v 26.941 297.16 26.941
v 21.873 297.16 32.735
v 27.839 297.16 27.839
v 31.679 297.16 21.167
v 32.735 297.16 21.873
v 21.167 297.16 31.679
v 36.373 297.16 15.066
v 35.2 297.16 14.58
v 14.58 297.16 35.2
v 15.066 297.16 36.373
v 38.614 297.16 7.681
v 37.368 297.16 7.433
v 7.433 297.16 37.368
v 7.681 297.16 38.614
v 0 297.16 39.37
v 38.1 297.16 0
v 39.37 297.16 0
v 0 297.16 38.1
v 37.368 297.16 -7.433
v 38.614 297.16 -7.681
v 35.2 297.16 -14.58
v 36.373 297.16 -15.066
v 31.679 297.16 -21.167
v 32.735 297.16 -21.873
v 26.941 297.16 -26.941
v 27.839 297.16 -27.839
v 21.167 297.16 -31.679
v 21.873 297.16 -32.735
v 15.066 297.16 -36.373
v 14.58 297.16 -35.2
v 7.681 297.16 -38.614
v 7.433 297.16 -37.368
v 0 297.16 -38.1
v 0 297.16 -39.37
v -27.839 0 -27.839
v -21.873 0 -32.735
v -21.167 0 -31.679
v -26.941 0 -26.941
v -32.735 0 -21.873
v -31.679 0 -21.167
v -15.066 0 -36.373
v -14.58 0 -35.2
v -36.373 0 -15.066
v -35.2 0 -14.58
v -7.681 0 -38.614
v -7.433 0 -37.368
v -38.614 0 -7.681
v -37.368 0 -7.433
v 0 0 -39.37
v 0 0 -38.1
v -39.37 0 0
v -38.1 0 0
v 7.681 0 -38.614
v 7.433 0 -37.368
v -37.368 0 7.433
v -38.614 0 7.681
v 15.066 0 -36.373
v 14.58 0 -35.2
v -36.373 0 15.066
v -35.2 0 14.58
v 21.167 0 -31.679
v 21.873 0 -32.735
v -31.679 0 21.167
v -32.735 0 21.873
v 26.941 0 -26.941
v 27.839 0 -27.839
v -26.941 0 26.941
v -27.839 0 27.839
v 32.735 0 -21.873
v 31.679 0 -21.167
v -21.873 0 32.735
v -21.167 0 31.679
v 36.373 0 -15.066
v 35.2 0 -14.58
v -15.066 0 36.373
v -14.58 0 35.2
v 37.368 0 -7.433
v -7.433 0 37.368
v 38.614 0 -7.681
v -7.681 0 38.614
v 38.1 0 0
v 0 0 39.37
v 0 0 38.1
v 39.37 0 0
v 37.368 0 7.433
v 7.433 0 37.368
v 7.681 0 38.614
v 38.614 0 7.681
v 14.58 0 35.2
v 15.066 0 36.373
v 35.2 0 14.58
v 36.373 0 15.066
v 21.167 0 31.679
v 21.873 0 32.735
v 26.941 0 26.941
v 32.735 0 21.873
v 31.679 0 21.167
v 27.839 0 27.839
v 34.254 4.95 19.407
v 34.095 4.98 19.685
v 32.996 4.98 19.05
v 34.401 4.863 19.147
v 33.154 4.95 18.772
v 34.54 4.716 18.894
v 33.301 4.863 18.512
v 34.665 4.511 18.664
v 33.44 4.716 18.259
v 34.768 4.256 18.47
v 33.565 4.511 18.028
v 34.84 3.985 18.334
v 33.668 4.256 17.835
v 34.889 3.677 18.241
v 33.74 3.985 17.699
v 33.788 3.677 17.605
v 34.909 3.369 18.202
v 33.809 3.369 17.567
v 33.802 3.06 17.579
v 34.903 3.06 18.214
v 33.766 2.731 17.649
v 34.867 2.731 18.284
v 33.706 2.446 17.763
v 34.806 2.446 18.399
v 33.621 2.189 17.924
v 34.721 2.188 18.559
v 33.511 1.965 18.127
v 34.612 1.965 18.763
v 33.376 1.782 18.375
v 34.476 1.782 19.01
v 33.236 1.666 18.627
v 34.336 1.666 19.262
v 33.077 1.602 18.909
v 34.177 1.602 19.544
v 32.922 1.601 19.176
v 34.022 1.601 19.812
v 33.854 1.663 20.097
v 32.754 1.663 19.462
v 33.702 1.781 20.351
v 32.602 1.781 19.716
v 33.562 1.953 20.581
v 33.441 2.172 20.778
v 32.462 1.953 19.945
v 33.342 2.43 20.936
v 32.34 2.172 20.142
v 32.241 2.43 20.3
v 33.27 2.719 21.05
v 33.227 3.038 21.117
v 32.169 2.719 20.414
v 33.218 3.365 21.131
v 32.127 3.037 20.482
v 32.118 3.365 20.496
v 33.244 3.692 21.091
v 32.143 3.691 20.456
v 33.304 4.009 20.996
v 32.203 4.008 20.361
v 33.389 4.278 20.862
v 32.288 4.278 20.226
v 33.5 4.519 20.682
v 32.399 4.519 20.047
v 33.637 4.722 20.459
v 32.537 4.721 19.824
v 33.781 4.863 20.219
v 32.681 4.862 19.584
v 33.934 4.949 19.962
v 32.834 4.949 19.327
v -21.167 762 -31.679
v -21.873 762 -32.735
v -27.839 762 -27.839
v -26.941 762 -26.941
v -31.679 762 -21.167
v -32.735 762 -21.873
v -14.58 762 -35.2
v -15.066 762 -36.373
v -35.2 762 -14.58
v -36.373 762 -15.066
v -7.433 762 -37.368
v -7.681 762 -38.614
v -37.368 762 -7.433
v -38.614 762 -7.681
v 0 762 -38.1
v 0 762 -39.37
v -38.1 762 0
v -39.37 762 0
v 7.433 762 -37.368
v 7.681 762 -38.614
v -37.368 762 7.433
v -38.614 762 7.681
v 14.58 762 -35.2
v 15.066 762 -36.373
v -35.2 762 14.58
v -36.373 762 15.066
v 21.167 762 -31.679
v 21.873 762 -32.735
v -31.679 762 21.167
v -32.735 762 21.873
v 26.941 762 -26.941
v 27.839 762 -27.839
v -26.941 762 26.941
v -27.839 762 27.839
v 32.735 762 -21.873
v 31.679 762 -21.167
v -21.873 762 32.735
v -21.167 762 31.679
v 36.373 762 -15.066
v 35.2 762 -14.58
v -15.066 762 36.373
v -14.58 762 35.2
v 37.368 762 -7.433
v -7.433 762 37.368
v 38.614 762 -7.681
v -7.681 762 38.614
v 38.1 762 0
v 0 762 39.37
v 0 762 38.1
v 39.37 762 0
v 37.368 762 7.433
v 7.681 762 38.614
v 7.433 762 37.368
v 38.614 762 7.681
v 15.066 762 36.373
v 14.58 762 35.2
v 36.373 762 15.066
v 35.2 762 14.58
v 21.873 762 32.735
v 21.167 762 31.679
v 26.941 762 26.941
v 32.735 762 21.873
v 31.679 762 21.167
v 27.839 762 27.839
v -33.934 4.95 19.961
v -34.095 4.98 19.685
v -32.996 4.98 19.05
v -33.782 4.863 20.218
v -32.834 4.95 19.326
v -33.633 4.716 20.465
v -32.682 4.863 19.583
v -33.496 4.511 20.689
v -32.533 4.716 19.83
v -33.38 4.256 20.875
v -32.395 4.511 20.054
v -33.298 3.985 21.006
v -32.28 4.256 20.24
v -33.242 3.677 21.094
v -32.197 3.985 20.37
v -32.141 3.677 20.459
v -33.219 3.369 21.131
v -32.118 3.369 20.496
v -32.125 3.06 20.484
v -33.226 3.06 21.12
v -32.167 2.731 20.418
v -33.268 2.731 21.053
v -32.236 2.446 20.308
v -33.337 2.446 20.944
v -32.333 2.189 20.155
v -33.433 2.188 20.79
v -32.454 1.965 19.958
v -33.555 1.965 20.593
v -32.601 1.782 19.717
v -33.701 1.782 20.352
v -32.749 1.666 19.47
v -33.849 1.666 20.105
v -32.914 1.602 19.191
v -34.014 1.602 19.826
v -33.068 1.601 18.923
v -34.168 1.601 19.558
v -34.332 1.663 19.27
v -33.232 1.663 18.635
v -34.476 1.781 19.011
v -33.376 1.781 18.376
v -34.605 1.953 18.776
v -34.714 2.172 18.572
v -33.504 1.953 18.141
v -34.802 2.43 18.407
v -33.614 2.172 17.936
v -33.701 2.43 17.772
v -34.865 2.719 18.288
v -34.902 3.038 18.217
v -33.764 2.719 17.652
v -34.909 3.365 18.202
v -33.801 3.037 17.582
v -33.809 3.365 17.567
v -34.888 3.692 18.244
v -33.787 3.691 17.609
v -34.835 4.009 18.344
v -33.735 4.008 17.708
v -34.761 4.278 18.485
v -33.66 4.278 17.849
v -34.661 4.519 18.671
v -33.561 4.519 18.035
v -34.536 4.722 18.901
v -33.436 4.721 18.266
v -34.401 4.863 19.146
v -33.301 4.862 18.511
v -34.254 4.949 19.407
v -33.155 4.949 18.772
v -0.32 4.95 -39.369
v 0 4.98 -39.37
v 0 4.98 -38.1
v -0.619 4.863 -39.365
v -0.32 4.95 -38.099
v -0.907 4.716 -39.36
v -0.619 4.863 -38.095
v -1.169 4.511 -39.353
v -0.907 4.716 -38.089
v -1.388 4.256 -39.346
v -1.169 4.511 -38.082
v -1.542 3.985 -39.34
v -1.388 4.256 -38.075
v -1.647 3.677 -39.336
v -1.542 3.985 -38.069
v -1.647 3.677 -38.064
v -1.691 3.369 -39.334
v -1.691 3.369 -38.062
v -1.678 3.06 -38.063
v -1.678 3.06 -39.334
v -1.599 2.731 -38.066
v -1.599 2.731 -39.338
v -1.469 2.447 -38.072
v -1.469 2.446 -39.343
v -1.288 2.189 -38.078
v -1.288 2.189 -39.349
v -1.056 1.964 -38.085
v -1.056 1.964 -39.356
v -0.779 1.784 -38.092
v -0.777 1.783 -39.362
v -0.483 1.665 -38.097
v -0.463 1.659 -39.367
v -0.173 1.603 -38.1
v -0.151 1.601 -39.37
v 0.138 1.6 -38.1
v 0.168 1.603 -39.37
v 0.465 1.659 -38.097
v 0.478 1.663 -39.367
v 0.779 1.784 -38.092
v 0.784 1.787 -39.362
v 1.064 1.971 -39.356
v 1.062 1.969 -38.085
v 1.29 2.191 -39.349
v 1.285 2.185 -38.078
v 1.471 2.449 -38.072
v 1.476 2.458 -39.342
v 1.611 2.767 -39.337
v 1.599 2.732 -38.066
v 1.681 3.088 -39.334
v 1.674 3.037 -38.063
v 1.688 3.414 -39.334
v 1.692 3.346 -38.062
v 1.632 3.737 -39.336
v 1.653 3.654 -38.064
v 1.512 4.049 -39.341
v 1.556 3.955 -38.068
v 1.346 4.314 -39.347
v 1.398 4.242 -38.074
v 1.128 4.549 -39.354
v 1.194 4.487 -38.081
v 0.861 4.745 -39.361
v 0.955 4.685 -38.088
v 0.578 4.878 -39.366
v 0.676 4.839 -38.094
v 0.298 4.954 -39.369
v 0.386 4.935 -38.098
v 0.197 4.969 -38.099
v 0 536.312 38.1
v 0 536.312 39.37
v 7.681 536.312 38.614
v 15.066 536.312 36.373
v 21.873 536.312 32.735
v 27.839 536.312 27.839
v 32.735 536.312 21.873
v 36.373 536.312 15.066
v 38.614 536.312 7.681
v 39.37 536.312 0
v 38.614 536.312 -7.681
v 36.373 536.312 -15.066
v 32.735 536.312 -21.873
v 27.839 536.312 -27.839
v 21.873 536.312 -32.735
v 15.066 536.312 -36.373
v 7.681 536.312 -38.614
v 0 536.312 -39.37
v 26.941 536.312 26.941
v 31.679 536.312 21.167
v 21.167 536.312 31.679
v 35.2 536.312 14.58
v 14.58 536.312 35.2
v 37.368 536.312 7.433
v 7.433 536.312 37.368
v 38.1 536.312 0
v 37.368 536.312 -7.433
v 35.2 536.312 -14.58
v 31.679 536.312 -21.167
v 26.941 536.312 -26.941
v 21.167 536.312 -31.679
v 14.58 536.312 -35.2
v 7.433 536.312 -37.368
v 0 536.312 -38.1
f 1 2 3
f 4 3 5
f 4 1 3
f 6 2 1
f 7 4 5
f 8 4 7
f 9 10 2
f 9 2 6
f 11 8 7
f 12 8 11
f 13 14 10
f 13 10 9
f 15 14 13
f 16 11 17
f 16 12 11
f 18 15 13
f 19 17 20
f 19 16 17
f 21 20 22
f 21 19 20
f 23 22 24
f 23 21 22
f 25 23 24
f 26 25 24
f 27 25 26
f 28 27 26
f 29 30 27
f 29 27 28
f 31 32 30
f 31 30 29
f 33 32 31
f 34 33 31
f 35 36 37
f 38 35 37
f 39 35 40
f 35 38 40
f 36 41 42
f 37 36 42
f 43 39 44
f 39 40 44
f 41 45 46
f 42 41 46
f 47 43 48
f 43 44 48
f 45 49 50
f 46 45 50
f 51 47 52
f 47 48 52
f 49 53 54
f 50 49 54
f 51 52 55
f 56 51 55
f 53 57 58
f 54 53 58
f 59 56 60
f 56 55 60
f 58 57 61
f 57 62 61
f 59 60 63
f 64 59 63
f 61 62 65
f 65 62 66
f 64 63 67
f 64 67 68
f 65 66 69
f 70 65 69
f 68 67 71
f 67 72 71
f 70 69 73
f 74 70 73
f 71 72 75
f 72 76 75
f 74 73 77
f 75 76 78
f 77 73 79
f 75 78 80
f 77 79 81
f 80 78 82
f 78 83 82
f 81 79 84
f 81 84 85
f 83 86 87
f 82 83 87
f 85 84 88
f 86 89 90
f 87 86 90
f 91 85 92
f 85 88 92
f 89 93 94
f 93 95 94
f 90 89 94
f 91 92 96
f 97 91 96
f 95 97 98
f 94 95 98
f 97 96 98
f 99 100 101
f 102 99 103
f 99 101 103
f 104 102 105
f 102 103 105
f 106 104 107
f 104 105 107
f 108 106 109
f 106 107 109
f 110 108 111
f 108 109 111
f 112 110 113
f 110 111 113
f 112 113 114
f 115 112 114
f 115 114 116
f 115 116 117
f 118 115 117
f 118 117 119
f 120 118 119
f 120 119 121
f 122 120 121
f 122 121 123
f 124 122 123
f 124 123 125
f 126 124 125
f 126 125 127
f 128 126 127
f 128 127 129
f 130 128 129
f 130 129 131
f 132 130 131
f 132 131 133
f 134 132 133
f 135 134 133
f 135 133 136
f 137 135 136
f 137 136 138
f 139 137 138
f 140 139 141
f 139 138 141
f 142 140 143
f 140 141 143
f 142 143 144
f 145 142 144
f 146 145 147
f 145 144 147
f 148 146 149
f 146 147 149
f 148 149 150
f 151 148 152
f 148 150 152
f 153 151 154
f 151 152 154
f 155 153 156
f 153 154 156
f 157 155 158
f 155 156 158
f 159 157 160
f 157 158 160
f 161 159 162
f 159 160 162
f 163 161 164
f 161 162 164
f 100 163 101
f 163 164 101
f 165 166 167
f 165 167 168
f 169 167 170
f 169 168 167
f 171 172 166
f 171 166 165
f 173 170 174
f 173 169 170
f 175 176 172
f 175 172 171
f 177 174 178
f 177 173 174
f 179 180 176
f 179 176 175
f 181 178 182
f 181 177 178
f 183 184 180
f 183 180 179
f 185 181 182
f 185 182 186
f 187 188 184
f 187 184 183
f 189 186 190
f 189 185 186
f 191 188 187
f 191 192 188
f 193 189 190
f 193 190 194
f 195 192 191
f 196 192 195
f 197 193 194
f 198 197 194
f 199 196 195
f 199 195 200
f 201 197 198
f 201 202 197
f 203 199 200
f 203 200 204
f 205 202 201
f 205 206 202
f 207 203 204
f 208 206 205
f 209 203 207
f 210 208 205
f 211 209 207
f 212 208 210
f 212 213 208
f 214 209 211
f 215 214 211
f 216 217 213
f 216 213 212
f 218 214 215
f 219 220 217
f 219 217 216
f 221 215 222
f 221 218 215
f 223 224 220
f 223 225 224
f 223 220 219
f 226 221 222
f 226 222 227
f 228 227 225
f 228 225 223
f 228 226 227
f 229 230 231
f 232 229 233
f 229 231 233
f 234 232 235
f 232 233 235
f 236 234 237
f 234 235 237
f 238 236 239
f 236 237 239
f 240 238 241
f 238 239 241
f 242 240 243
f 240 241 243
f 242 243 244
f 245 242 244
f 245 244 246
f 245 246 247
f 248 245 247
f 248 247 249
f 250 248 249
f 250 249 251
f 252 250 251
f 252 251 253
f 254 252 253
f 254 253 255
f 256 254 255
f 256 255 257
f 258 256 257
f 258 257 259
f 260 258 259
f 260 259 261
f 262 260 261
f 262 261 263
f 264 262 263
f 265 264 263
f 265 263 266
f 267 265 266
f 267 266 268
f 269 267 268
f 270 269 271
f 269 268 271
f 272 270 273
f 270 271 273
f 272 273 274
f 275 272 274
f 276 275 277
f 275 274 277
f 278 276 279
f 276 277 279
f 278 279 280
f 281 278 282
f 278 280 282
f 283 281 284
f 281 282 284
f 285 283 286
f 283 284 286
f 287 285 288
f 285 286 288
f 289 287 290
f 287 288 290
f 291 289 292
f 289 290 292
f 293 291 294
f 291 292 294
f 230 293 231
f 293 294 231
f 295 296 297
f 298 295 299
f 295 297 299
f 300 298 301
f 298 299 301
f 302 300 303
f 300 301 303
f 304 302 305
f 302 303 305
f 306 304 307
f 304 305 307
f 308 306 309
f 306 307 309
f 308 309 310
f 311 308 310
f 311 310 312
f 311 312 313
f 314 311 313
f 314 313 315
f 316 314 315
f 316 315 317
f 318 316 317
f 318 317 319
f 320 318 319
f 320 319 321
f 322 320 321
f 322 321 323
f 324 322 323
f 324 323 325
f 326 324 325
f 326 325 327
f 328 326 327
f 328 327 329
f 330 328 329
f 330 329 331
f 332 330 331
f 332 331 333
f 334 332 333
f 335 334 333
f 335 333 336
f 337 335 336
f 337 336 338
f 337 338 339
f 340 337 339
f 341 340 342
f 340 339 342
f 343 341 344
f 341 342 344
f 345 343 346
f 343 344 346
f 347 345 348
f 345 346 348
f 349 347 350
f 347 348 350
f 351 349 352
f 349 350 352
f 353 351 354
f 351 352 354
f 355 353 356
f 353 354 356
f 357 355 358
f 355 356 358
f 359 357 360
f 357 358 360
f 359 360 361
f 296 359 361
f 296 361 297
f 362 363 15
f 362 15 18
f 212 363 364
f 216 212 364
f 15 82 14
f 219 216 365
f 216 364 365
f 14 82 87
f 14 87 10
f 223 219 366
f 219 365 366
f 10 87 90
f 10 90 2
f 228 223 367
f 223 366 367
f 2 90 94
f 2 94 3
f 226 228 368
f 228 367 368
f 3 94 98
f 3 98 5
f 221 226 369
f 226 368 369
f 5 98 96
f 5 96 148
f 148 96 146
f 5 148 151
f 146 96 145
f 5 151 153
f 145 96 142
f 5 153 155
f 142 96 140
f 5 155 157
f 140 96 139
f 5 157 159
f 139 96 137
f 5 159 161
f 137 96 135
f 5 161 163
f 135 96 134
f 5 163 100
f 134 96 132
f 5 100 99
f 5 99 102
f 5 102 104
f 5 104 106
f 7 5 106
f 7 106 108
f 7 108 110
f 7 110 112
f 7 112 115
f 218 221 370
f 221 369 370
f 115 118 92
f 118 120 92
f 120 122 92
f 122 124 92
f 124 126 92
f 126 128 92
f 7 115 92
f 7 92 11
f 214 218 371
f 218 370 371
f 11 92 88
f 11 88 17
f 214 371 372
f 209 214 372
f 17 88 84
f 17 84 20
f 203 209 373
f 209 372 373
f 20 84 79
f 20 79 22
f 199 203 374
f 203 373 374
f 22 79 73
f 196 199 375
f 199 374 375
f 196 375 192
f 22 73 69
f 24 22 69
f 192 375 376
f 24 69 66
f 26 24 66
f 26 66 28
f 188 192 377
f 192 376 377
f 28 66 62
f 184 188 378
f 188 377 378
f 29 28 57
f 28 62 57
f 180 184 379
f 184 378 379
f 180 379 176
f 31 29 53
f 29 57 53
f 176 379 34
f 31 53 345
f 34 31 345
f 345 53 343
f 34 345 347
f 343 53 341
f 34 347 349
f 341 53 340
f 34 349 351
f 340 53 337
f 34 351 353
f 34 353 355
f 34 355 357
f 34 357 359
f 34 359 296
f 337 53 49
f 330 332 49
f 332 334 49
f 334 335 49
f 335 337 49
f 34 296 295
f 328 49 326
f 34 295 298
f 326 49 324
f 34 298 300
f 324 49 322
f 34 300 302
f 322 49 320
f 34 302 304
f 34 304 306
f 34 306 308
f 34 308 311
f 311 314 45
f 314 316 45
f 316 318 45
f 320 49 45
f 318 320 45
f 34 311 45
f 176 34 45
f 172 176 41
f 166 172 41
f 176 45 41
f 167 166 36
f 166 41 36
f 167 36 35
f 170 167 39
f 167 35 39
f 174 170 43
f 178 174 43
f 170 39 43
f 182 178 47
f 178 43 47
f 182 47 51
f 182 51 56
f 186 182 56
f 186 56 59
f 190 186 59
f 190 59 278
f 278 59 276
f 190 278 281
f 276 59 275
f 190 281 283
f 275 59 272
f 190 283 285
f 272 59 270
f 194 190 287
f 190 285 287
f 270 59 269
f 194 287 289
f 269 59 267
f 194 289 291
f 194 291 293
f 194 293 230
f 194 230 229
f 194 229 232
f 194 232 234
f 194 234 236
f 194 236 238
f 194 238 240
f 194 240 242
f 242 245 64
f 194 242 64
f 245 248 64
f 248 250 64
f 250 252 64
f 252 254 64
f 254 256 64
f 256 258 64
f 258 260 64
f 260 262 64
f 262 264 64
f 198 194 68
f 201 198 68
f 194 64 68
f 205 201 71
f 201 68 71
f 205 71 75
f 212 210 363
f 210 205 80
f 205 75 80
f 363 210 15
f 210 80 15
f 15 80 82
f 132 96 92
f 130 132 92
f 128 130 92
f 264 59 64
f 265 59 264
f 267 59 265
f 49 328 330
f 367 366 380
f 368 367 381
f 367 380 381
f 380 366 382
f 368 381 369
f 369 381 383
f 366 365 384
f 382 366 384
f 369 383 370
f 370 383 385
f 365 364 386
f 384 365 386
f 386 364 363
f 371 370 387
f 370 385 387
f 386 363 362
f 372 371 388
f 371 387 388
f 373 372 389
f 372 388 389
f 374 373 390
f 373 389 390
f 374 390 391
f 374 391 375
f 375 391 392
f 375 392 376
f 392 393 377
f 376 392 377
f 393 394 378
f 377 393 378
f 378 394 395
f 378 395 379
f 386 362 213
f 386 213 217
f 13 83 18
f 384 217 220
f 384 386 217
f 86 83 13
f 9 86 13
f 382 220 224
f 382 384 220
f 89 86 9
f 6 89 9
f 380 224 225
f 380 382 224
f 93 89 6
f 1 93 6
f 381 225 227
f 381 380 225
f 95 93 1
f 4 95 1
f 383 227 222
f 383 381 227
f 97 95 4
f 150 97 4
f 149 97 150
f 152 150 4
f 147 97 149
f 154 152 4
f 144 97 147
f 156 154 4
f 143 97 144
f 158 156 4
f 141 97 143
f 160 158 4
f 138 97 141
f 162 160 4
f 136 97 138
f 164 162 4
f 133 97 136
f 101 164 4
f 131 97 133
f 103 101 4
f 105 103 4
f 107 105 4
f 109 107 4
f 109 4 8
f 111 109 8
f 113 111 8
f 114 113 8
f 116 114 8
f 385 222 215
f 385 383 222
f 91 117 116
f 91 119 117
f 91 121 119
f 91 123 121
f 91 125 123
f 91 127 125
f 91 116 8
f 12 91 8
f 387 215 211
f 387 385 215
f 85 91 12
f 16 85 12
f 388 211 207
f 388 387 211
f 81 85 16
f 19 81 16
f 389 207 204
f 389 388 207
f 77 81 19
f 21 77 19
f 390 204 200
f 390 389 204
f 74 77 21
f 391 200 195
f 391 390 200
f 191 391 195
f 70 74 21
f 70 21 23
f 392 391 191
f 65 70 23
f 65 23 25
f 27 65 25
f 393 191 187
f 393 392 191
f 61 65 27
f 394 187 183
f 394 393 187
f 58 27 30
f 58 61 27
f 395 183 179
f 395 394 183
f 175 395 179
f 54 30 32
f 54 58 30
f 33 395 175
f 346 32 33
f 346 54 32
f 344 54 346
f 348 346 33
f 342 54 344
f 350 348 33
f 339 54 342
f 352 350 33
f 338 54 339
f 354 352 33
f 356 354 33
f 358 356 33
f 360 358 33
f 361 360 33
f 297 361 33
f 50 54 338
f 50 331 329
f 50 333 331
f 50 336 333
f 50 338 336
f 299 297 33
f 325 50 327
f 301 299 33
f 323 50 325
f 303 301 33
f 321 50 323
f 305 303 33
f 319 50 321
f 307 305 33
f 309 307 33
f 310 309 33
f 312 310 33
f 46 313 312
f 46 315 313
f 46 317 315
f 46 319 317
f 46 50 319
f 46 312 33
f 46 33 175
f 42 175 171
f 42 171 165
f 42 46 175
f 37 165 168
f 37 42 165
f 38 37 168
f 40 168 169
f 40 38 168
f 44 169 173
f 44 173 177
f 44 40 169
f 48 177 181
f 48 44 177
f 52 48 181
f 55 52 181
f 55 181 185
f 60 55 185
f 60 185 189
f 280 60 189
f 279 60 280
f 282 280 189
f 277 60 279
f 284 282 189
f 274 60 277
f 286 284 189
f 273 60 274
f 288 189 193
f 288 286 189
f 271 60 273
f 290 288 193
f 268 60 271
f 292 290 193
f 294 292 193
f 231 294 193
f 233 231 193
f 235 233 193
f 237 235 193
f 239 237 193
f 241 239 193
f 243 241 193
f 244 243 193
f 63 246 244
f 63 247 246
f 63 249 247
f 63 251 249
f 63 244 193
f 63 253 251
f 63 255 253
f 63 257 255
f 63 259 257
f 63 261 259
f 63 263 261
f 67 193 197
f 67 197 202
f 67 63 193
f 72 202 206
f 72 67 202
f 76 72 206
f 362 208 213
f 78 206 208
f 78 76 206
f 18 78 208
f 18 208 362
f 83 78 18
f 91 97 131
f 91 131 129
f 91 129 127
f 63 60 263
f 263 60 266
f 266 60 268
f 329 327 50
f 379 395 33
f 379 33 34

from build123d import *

# Parameters (mm, degrees)
SKETCH1_R           = 39.37
SKETCH1_R_2         = 38.1
BOSS_EXTRUDE1_DEPTH = 762
SKETCH2_R           = 1.692869147
CUT_EXTRUDE1_DEPTH  = 61.4
CIRPATTERN3_COUNT   = 3
SKETCH4_W           = 96.846889453
SKETCH4_H           = 239.152522935
CUT_EXTRUDE3_DEPTH  = 200


with BuildPart() as part:
    # Sketch1 → Boss-Extrude1 (new body)
    with BuildSketch(Plane(origin=(0, 0, 0), x_dir=(1, 0, 0), z_dir=(0, 1, 0))):
        with Locations(Location((0, 0, 0), (0, 0, 270))):
            Circle(SKETCH1_R)
        with Locations(Location((0, 0, 0), (0, 0, 270))):
            Circle(SKETCH1_R_2, mode=Mode.SUBTRACT)
    extrude(amount=BOSS_EXTRUDE1_DEPTH)

    # Sketch2 → Cut-Extrude1 (cut)
    with BuildSketch(Plane.XY):
        with Locations(Location((0, 3.287142885, 0), (0, 0, 90))):
            Circle(SKETCH2_R)
    cut_extrude1 = extrude(amount=-CUT_EXTRUDE1_DEPTH, mode=Mode.SUBTRACT)

    # CirPattern3: Cut-Extrude1 ×3 about axis
    cirpattern3_axis = Axis((0, 0, 0), (0, -1, 0))
    for i in range(1, CIRPATTERN3_COUNT):
        add(cut_extrude1.rotate(cirpattern3_axis, i * 360 / CIRPATTERN3_COUNT), mode=Mode.SUBTRACT)

    # Sketch4 → Cut-Extrude3 (cut)
    with BuildSketch(Plane(origin=(0, 0, 0), x_dir=(0, 0, -1), z_dir=(1, 0, 0))):
        with Locations((-1.346410096, 416.735952277)):
            Rectangle(SKETCH4_W, SKETCH4_H)
    extrude(amount=CUT_EXTRUDE3_DEPTH, mode=Mode.SUBTRACT)


solid = part.part
